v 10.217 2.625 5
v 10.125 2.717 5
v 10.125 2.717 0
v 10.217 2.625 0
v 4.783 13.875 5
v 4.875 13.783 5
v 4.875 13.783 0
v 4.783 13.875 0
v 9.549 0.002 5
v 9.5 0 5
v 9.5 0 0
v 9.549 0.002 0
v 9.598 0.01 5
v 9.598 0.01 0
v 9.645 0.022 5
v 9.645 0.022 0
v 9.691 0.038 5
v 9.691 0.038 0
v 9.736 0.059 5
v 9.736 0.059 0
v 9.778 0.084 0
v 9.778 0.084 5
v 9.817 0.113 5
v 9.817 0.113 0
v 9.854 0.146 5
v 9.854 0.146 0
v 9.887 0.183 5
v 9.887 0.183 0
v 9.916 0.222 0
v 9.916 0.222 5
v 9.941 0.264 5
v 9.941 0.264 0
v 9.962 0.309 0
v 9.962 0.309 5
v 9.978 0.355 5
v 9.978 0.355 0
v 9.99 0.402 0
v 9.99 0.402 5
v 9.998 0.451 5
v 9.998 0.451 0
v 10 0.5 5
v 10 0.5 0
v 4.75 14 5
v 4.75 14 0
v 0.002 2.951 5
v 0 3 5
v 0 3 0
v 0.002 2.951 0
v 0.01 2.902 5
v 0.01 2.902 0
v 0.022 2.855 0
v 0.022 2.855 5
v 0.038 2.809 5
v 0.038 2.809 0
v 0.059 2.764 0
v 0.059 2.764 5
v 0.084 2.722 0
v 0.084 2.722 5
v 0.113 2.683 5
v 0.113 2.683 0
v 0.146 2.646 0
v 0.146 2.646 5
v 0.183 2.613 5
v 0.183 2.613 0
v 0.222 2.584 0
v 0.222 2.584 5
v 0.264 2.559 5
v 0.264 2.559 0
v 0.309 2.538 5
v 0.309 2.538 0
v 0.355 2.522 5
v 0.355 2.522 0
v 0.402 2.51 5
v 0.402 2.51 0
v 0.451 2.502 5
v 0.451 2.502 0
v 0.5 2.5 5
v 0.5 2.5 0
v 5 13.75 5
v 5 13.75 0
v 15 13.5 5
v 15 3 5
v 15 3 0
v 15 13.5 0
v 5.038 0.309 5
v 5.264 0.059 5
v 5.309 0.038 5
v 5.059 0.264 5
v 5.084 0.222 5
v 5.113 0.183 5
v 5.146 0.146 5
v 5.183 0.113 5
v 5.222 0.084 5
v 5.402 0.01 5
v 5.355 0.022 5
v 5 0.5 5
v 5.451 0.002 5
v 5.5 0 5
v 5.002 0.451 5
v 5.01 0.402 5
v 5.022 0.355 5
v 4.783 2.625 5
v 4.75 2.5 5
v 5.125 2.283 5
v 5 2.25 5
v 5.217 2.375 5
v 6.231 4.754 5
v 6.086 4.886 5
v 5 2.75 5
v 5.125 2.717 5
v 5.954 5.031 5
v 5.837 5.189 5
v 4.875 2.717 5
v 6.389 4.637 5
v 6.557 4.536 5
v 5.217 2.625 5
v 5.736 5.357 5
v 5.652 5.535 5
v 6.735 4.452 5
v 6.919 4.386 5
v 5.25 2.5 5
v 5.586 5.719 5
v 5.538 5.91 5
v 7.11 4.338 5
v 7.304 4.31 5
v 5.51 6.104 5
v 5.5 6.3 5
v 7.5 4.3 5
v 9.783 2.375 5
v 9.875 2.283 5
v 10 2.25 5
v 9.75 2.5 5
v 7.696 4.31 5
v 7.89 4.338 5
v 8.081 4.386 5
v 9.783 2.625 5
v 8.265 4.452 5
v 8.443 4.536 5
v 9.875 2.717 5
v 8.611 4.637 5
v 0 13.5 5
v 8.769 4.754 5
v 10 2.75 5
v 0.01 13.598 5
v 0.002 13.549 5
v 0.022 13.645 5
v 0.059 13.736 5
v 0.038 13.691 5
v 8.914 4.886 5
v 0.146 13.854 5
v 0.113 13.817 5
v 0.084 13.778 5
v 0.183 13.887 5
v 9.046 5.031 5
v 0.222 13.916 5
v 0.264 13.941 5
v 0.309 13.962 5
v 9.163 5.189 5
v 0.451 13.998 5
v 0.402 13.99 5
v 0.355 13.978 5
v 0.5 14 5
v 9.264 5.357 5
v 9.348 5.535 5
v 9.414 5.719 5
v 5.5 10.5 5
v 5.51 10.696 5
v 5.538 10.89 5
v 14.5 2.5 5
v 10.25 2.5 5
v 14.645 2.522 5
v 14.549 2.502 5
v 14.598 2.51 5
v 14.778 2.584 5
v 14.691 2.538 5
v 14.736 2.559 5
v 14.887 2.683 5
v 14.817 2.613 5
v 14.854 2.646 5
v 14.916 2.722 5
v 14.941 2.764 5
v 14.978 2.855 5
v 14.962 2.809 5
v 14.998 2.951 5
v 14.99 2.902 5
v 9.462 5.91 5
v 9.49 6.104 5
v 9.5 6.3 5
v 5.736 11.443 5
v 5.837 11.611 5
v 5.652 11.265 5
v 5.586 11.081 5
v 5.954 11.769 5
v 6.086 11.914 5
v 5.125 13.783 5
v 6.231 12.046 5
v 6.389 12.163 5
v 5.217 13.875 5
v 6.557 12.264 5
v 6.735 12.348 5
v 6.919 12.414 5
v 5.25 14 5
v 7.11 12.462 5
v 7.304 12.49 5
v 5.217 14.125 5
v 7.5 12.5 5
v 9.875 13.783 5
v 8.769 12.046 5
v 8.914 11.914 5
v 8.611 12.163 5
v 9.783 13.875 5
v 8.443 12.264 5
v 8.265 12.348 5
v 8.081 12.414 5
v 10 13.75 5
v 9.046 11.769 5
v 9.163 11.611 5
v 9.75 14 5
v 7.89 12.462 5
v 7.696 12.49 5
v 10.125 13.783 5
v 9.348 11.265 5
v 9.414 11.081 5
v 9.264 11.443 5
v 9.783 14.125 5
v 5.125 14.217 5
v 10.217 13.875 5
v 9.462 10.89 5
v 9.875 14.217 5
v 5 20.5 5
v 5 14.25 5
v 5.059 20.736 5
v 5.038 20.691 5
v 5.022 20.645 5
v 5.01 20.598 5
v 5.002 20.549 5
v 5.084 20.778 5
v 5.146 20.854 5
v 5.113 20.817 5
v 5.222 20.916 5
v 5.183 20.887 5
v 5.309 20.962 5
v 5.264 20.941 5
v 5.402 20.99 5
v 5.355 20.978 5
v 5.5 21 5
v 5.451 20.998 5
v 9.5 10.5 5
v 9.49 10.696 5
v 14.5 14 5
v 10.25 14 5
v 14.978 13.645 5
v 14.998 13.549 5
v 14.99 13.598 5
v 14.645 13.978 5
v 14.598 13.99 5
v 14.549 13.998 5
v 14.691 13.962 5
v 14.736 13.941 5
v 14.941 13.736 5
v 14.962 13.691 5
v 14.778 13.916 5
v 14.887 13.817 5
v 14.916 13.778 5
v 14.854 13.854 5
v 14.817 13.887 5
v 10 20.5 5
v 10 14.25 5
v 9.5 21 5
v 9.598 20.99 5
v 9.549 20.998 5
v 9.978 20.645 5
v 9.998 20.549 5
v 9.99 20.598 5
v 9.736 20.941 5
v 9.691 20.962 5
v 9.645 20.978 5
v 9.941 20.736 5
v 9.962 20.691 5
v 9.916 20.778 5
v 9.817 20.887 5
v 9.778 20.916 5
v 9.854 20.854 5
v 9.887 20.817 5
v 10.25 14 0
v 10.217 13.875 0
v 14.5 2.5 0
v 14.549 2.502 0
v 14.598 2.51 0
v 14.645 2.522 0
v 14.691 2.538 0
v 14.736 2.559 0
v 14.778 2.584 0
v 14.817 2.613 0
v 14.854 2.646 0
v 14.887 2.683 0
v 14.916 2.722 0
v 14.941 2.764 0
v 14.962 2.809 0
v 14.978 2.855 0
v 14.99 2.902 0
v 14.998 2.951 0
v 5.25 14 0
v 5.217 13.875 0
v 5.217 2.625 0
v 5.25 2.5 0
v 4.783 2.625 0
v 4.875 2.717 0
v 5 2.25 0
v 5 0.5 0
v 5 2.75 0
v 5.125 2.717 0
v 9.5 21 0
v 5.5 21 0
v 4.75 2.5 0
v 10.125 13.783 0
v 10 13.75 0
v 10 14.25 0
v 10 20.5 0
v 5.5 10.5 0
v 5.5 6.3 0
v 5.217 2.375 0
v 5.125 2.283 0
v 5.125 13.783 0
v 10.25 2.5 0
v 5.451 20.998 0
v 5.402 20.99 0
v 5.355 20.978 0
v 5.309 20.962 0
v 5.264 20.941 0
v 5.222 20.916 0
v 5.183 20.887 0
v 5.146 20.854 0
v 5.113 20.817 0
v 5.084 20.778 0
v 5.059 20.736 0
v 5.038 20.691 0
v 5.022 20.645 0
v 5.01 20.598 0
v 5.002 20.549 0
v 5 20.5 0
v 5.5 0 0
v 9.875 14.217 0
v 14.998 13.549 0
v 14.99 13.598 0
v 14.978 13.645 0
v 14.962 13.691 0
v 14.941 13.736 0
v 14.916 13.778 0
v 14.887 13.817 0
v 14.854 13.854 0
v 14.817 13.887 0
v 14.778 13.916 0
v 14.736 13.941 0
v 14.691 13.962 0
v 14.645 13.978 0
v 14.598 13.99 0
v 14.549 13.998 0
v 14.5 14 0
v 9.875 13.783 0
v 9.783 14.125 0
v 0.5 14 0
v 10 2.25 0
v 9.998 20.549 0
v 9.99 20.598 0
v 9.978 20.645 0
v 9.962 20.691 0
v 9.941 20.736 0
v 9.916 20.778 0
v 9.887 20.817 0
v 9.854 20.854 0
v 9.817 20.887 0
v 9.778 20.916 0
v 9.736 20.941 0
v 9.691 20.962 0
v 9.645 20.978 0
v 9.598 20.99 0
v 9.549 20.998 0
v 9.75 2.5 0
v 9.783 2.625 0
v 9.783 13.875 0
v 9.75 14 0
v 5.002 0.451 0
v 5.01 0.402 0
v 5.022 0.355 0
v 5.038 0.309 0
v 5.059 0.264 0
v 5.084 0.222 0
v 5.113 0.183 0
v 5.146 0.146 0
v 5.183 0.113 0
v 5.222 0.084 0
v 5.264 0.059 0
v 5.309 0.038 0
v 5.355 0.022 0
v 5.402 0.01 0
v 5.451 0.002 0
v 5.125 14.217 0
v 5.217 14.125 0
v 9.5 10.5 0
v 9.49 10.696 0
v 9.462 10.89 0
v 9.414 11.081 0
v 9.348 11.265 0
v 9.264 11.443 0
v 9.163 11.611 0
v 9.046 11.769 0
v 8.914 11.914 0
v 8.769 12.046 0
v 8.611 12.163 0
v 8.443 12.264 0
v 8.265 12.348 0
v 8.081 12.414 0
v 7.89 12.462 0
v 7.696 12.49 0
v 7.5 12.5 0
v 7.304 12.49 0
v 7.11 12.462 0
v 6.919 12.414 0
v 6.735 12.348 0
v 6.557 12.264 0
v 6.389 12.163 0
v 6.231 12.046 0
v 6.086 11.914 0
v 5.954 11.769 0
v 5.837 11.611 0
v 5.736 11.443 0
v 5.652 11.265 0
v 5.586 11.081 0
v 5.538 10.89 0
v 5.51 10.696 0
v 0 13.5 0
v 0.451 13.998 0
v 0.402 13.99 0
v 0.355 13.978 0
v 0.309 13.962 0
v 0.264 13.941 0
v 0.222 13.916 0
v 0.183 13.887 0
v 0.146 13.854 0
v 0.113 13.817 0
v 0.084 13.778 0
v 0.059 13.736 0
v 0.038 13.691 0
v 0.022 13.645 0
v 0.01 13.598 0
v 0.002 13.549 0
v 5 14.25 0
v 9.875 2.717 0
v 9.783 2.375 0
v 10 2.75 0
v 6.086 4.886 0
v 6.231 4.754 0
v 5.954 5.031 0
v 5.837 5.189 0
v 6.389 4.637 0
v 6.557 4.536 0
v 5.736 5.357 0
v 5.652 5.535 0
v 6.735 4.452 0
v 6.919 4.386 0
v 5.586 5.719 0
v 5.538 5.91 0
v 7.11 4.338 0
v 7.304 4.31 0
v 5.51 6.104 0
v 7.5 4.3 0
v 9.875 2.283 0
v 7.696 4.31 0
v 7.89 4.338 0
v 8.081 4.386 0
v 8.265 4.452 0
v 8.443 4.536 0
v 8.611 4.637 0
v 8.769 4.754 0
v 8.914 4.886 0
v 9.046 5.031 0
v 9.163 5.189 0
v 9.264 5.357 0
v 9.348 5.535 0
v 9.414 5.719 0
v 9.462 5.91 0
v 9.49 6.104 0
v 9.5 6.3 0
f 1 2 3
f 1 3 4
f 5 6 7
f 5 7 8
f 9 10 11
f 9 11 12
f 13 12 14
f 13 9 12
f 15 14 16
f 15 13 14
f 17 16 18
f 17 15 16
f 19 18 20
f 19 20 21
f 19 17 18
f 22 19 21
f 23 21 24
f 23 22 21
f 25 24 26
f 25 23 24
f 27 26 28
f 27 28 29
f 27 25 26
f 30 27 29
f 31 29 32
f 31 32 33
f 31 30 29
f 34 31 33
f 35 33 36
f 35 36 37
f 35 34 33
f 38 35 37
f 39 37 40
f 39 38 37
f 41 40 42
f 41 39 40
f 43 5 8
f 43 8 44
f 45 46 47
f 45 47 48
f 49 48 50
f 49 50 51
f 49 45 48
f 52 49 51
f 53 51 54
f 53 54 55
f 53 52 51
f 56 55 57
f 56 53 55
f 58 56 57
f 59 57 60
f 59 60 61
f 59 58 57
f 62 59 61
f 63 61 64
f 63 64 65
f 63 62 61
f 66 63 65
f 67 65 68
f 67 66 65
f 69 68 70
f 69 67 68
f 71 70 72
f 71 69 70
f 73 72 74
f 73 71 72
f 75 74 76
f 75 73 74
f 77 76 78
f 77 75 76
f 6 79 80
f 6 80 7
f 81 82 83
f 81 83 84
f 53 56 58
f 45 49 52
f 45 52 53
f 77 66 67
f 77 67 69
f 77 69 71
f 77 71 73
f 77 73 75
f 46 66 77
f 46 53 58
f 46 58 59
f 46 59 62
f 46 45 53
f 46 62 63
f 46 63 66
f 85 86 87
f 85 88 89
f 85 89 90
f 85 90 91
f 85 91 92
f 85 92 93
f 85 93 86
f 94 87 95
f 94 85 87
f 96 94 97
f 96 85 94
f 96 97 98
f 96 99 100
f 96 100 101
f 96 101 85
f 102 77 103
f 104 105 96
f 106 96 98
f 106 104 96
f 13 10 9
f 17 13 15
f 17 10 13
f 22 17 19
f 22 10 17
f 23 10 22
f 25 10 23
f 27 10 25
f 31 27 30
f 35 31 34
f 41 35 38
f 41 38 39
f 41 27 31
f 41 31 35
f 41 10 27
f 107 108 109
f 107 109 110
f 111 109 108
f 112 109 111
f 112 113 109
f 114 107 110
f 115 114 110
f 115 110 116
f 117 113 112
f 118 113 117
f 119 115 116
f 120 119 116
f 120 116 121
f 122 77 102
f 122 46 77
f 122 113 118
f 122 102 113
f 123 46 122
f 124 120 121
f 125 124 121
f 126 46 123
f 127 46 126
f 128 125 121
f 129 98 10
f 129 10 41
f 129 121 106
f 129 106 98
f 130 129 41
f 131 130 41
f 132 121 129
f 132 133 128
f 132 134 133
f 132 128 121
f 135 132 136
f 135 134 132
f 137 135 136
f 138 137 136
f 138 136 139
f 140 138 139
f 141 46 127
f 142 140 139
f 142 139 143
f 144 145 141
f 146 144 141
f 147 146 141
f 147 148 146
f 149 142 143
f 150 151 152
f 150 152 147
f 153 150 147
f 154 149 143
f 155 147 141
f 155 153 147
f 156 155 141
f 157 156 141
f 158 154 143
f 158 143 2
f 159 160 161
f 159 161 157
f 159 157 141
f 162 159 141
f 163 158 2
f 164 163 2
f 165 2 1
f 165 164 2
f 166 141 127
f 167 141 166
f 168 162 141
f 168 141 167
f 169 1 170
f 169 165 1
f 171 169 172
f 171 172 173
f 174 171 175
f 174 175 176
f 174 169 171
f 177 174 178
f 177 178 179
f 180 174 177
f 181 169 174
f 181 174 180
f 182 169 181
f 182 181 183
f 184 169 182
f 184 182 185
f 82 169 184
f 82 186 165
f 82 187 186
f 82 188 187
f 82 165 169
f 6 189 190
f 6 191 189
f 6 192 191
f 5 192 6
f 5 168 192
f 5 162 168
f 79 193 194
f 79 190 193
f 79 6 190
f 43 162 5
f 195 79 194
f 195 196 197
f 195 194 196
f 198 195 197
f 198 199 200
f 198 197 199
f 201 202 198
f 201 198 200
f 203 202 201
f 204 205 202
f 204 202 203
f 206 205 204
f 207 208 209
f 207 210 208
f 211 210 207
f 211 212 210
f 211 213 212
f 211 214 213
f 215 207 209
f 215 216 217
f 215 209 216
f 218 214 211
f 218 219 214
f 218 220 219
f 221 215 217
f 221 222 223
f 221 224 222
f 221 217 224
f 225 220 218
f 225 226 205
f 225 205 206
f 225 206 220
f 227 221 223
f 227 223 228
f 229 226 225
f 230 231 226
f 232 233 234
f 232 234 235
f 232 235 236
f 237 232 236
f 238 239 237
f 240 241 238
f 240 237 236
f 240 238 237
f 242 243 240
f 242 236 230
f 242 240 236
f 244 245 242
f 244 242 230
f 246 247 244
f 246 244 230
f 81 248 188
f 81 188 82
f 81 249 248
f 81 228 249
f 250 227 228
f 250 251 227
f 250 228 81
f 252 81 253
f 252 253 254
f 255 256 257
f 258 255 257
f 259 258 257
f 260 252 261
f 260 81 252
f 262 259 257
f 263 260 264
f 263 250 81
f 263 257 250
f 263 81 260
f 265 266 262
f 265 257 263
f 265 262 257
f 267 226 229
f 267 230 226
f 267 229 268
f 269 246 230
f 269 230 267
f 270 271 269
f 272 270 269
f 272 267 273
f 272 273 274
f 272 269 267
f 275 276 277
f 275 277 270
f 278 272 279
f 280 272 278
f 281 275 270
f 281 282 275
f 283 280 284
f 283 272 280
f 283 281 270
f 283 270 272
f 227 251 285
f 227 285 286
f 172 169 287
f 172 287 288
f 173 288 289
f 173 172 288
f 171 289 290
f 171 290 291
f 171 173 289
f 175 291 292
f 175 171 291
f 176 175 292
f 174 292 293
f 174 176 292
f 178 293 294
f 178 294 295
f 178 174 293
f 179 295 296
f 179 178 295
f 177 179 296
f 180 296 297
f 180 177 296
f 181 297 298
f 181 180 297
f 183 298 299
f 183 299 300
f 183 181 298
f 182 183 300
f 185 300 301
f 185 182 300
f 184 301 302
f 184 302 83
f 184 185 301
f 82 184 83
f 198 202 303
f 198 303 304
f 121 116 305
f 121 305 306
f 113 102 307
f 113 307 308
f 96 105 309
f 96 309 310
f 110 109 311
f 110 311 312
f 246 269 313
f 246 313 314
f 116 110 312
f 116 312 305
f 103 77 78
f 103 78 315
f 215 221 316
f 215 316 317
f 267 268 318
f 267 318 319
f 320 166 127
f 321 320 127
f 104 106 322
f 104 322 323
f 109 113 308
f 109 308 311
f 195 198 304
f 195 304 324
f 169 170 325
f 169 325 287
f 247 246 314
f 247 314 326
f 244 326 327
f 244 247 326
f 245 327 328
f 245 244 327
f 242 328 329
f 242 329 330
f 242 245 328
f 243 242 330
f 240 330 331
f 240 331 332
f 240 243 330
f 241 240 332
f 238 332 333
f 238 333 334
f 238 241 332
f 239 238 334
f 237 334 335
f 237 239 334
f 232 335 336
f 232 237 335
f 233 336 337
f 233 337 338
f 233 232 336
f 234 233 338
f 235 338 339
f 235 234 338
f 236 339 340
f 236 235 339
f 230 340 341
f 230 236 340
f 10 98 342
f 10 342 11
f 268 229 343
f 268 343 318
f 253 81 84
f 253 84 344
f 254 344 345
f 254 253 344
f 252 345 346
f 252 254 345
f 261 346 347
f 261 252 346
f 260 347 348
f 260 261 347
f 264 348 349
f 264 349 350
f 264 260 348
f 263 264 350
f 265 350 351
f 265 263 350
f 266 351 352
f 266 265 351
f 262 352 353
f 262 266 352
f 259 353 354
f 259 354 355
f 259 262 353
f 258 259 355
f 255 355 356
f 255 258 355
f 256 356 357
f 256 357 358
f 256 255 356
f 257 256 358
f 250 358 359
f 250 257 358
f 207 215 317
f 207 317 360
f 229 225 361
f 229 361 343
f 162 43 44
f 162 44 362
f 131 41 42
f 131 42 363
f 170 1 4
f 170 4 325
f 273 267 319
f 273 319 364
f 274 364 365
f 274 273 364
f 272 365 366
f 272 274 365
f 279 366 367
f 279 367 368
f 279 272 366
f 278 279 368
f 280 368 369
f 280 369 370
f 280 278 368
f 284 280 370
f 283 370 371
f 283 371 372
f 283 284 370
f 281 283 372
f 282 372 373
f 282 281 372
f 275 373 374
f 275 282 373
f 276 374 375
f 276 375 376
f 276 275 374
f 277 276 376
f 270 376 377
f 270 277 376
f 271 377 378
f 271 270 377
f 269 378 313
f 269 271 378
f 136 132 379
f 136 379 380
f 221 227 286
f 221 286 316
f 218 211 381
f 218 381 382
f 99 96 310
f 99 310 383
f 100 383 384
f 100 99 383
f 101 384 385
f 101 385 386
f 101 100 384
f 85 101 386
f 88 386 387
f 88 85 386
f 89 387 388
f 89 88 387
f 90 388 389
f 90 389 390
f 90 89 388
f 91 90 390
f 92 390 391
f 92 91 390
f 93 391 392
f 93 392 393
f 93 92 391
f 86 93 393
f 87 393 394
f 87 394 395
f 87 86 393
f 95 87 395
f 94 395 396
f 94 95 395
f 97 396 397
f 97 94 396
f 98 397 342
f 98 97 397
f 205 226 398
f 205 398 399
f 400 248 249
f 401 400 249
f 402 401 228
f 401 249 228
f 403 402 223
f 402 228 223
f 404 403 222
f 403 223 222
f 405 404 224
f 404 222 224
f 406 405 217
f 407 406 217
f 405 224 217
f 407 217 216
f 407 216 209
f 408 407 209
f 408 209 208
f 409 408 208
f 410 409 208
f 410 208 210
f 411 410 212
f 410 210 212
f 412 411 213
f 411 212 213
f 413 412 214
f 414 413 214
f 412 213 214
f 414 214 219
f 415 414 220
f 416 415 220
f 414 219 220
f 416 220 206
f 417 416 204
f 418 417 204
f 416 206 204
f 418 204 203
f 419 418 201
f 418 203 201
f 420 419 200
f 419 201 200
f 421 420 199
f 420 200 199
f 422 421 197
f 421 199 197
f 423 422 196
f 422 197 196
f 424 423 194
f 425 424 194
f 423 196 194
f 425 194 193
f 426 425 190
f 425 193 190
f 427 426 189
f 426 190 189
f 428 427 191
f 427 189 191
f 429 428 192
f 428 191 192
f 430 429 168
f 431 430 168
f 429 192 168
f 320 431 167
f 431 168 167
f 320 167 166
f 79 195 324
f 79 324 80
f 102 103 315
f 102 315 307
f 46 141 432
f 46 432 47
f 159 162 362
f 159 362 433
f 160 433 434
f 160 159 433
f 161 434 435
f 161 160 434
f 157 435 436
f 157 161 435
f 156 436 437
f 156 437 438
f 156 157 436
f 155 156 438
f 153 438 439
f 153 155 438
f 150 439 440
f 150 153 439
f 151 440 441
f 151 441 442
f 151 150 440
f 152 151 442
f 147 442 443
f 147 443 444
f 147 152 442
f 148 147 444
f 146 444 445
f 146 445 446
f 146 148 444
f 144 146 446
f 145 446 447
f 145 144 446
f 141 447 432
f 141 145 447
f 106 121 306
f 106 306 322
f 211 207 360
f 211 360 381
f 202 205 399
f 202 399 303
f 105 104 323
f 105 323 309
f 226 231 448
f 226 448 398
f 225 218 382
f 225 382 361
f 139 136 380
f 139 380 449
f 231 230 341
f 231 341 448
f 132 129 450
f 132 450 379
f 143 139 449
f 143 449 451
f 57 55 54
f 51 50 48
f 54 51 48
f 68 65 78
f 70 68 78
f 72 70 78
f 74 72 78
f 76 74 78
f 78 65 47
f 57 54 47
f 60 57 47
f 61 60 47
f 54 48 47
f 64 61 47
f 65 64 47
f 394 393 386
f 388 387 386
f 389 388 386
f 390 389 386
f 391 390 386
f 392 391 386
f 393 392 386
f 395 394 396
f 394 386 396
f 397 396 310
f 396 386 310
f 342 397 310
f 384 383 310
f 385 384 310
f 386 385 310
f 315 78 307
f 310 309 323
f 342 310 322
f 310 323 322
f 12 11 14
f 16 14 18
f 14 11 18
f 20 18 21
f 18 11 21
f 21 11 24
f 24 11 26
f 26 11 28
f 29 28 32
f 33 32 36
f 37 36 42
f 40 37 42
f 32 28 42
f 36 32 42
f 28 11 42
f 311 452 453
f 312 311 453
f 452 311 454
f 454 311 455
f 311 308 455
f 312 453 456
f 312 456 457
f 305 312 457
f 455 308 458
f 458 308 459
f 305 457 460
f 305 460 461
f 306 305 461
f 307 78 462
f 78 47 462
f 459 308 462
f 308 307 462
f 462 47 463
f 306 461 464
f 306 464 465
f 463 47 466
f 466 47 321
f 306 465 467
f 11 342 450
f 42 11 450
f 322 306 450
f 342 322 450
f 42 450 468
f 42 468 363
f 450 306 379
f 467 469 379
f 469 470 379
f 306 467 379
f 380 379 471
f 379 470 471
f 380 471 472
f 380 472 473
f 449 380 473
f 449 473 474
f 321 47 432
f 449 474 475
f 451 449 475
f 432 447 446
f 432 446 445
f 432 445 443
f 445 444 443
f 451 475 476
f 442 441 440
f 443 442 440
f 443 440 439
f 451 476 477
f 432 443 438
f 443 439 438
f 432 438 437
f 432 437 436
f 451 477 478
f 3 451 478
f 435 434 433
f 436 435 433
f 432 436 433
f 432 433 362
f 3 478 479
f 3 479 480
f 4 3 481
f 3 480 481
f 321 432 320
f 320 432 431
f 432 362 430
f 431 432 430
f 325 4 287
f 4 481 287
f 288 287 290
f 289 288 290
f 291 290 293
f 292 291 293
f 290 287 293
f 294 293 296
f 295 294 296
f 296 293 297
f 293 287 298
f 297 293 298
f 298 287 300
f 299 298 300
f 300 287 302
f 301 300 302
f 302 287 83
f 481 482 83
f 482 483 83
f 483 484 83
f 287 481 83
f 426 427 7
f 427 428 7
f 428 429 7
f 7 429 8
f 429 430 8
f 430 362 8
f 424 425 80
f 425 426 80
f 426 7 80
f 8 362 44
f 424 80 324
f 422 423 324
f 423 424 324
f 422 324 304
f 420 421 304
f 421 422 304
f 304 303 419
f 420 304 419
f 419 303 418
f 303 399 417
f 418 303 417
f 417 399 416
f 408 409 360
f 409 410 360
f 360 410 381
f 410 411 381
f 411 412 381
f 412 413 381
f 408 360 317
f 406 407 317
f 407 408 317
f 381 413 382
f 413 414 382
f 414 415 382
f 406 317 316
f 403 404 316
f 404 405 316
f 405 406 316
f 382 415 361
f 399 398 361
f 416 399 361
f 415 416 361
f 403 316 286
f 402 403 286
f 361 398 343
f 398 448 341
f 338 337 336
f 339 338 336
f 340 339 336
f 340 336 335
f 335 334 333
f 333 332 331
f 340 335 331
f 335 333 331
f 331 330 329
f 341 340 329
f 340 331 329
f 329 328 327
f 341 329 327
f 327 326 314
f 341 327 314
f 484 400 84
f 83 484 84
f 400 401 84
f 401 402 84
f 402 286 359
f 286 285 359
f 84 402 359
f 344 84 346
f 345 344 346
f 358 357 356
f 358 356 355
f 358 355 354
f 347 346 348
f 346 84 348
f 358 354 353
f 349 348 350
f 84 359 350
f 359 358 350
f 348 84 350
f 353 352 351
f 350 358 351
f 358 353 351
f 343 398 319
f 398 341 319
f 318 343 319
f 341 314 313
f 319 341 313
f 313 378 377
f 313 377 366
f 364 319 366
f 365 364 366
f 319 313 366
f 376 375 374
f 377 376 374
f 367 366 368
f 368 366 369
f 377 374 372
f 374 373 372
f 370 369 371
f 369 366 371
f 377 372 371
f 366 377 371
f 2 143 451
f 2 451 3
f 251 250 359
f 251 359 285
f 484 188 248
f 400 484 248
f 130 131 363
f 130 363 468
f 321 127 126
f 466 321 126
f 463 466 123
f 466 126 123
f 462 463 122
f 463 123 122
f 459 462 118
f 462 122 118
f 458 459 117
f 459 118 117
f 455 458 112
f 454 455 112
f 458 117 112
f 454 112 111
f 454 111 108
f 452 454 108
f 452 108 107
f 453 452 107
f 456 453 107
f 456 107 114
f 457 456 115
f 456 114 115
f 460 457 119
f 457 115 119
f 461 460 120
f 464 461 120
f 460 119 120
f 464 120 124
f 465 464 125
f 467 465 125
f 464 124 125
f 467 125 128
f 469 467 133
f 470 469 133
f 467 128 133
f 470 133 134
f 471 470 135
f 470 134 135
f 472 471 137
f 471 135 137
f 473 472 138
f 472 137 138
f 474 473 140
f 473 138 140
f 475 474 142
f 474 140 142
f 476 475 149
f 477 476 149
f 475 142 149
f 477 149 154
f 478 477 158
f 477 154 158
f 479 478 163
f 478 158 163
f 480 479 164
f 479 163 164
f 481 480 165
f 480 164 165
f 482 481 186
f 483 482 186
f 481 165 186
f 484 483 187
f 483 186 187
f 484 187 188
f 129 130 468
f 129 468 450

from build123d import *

# Parameters (mm, degrees)
BOSS_EXTRU_1_DEPTH = 5


with BuildPart() as part:
    # Esquisse1 → Boss.-Extru.1 (new body)
    with BuildSketch(Plane.XY.offset(5)):
        with BuildLine():
            Line((10, 14.25), (10, 20.5))
            ThreePointArc((10, 20.5), (9.853553391, 20.853553391), (9.5, 21))
            Line((9.5, 21), (5.5, 21))
            ThreePointArc((5.5, 21), (5.146446609, 20.853553391), (5, 20.5))
            Line((5, 20.5), (5, 14.25))
            Line((5, 14.25), (5.125, 14.21651))
            Line((5.125, 14.21651), (5.216506, 14.125))
            Line((5.216506, 14.125), (5.25, 14))
            Line((5.25, 14), (5.216506, 13.875))
            Line((5.216506, 13.875), (5.125, 13.78349))
            Line((5.125, 13.78349), (5, 13.75))
            Line((5, 13.75), (4.875, 13.78349))
            Line((4.875, 13.78349), (4.783494, 13.875))
            Line((4.783494, 13.875), (4.75, 14))
            Line((4.75, 14), (0.5, 14))
            ThreePointArc((0.5, 14), (0.146446609, 13.853553391), (0, 13.5))
            Line((0, 13.5), (0, 3))
            ThreePointArc((0, 3), (0.146446609, 2.646446609), (0.5, 2.5))
            Line((0.5, 2.5), (4.75, 2.5))
            Line((4.75, 2.5), (4.783494, 2.625))
            Line((4.783494, 2.625), (4.875, 2.716506))
            Line((4.875, 2.716506), (5, 2.75))
            Line((5, 2.75), (5.125, 2.716506))
            Line((5.125, 2.716506), (5.216506, 2.625))
            Line((5.216506, 2.625), (5.25, 2.5))
            Line((5.25, 2.5), (5.216506, 2.375))
            Line((5.216506, 2.375), (5.125, 2.283494))
            Line((5.125, 2.283494), (5, 2.25))
            Line((5, 2.25), (5, 0.4999999))
            ThreePointArc((5, 0.4999999), (5.14644658, 0.14644658), (5.4999999, 0))
            Line((5.4999999, 0), (9.5, 0))
            ThreePointArc((9.5, 0), (9.853553391, 0.146446609), (10, 0.5))
            Line((10, 0.5), (10, 2.25))
            Line((10, 2.25), (9.875, 2.283494))
            Line((9.875, 2.283494), (9.783493, 2.375))
            Line((9.783493, 2.375), (9.75, 2.5))
            Line((9.75, 2.5), (9.783493, 2.625))
            Line((9.783493, 2.625), (9.875, 2.716506))
            Line((9.875, 2.716506), (10, 2.75))
            Line((10, 2.75), (10.125, 2.716506))
            Line((10.125, 2.716506), (10.21651, 2.625))
            Line((10.21651, 2.625), (10.25, 2.5))
            Line((10.25, 2.5), (14.5, 2.5))
            ThreePointArc((14.5, 2.5), (14.853553391, 2.646446609), (15, 3))
            Line((15, 3), (15, 13.5))
            ThreePointArc((15, 13.5), (14.853553391, 13.853553391), (14.5, 14))
            Line((14.5, 14), (10.25, 14))
            Line((10.25, 14), (10.21651, 13.875))
            Line((10.21651, 13.875), (10.125, 13.78349))
            Line((10.125, 13.78349), (10, 13.75))
            Line((10, 13.75), (9.875, 13.78349))
            Line((9.875, 13.78349), (9.783493, 13.875))
            Line((9.783493, 13.875), (9.75, 14))
            Line((9.75, 14), (9.783493, 14.125))
            Line((9.783493, 14.125), (9.875, 14.21651))
            Line((9.875, 14.21651), (10, 14.25))
        make_face()
        with BuildLine():
            Line((5.5, 10.5), (5.5, 6.3))
            ThreePointArc((5.5, 6.3), (7.5, 4.3), (9.5, 6.3))
            Line((9.5, 6.3), (9.5, 10.5))
            ThreePointArc((9.5, 10.5), (7.5, 12.5), (5.5, 10.5))
        make_face(mode=Mode.SUBTRACT)
    extrude(amount=-BOSS_EXTRU_1_DEPTH)


solid = part.part
